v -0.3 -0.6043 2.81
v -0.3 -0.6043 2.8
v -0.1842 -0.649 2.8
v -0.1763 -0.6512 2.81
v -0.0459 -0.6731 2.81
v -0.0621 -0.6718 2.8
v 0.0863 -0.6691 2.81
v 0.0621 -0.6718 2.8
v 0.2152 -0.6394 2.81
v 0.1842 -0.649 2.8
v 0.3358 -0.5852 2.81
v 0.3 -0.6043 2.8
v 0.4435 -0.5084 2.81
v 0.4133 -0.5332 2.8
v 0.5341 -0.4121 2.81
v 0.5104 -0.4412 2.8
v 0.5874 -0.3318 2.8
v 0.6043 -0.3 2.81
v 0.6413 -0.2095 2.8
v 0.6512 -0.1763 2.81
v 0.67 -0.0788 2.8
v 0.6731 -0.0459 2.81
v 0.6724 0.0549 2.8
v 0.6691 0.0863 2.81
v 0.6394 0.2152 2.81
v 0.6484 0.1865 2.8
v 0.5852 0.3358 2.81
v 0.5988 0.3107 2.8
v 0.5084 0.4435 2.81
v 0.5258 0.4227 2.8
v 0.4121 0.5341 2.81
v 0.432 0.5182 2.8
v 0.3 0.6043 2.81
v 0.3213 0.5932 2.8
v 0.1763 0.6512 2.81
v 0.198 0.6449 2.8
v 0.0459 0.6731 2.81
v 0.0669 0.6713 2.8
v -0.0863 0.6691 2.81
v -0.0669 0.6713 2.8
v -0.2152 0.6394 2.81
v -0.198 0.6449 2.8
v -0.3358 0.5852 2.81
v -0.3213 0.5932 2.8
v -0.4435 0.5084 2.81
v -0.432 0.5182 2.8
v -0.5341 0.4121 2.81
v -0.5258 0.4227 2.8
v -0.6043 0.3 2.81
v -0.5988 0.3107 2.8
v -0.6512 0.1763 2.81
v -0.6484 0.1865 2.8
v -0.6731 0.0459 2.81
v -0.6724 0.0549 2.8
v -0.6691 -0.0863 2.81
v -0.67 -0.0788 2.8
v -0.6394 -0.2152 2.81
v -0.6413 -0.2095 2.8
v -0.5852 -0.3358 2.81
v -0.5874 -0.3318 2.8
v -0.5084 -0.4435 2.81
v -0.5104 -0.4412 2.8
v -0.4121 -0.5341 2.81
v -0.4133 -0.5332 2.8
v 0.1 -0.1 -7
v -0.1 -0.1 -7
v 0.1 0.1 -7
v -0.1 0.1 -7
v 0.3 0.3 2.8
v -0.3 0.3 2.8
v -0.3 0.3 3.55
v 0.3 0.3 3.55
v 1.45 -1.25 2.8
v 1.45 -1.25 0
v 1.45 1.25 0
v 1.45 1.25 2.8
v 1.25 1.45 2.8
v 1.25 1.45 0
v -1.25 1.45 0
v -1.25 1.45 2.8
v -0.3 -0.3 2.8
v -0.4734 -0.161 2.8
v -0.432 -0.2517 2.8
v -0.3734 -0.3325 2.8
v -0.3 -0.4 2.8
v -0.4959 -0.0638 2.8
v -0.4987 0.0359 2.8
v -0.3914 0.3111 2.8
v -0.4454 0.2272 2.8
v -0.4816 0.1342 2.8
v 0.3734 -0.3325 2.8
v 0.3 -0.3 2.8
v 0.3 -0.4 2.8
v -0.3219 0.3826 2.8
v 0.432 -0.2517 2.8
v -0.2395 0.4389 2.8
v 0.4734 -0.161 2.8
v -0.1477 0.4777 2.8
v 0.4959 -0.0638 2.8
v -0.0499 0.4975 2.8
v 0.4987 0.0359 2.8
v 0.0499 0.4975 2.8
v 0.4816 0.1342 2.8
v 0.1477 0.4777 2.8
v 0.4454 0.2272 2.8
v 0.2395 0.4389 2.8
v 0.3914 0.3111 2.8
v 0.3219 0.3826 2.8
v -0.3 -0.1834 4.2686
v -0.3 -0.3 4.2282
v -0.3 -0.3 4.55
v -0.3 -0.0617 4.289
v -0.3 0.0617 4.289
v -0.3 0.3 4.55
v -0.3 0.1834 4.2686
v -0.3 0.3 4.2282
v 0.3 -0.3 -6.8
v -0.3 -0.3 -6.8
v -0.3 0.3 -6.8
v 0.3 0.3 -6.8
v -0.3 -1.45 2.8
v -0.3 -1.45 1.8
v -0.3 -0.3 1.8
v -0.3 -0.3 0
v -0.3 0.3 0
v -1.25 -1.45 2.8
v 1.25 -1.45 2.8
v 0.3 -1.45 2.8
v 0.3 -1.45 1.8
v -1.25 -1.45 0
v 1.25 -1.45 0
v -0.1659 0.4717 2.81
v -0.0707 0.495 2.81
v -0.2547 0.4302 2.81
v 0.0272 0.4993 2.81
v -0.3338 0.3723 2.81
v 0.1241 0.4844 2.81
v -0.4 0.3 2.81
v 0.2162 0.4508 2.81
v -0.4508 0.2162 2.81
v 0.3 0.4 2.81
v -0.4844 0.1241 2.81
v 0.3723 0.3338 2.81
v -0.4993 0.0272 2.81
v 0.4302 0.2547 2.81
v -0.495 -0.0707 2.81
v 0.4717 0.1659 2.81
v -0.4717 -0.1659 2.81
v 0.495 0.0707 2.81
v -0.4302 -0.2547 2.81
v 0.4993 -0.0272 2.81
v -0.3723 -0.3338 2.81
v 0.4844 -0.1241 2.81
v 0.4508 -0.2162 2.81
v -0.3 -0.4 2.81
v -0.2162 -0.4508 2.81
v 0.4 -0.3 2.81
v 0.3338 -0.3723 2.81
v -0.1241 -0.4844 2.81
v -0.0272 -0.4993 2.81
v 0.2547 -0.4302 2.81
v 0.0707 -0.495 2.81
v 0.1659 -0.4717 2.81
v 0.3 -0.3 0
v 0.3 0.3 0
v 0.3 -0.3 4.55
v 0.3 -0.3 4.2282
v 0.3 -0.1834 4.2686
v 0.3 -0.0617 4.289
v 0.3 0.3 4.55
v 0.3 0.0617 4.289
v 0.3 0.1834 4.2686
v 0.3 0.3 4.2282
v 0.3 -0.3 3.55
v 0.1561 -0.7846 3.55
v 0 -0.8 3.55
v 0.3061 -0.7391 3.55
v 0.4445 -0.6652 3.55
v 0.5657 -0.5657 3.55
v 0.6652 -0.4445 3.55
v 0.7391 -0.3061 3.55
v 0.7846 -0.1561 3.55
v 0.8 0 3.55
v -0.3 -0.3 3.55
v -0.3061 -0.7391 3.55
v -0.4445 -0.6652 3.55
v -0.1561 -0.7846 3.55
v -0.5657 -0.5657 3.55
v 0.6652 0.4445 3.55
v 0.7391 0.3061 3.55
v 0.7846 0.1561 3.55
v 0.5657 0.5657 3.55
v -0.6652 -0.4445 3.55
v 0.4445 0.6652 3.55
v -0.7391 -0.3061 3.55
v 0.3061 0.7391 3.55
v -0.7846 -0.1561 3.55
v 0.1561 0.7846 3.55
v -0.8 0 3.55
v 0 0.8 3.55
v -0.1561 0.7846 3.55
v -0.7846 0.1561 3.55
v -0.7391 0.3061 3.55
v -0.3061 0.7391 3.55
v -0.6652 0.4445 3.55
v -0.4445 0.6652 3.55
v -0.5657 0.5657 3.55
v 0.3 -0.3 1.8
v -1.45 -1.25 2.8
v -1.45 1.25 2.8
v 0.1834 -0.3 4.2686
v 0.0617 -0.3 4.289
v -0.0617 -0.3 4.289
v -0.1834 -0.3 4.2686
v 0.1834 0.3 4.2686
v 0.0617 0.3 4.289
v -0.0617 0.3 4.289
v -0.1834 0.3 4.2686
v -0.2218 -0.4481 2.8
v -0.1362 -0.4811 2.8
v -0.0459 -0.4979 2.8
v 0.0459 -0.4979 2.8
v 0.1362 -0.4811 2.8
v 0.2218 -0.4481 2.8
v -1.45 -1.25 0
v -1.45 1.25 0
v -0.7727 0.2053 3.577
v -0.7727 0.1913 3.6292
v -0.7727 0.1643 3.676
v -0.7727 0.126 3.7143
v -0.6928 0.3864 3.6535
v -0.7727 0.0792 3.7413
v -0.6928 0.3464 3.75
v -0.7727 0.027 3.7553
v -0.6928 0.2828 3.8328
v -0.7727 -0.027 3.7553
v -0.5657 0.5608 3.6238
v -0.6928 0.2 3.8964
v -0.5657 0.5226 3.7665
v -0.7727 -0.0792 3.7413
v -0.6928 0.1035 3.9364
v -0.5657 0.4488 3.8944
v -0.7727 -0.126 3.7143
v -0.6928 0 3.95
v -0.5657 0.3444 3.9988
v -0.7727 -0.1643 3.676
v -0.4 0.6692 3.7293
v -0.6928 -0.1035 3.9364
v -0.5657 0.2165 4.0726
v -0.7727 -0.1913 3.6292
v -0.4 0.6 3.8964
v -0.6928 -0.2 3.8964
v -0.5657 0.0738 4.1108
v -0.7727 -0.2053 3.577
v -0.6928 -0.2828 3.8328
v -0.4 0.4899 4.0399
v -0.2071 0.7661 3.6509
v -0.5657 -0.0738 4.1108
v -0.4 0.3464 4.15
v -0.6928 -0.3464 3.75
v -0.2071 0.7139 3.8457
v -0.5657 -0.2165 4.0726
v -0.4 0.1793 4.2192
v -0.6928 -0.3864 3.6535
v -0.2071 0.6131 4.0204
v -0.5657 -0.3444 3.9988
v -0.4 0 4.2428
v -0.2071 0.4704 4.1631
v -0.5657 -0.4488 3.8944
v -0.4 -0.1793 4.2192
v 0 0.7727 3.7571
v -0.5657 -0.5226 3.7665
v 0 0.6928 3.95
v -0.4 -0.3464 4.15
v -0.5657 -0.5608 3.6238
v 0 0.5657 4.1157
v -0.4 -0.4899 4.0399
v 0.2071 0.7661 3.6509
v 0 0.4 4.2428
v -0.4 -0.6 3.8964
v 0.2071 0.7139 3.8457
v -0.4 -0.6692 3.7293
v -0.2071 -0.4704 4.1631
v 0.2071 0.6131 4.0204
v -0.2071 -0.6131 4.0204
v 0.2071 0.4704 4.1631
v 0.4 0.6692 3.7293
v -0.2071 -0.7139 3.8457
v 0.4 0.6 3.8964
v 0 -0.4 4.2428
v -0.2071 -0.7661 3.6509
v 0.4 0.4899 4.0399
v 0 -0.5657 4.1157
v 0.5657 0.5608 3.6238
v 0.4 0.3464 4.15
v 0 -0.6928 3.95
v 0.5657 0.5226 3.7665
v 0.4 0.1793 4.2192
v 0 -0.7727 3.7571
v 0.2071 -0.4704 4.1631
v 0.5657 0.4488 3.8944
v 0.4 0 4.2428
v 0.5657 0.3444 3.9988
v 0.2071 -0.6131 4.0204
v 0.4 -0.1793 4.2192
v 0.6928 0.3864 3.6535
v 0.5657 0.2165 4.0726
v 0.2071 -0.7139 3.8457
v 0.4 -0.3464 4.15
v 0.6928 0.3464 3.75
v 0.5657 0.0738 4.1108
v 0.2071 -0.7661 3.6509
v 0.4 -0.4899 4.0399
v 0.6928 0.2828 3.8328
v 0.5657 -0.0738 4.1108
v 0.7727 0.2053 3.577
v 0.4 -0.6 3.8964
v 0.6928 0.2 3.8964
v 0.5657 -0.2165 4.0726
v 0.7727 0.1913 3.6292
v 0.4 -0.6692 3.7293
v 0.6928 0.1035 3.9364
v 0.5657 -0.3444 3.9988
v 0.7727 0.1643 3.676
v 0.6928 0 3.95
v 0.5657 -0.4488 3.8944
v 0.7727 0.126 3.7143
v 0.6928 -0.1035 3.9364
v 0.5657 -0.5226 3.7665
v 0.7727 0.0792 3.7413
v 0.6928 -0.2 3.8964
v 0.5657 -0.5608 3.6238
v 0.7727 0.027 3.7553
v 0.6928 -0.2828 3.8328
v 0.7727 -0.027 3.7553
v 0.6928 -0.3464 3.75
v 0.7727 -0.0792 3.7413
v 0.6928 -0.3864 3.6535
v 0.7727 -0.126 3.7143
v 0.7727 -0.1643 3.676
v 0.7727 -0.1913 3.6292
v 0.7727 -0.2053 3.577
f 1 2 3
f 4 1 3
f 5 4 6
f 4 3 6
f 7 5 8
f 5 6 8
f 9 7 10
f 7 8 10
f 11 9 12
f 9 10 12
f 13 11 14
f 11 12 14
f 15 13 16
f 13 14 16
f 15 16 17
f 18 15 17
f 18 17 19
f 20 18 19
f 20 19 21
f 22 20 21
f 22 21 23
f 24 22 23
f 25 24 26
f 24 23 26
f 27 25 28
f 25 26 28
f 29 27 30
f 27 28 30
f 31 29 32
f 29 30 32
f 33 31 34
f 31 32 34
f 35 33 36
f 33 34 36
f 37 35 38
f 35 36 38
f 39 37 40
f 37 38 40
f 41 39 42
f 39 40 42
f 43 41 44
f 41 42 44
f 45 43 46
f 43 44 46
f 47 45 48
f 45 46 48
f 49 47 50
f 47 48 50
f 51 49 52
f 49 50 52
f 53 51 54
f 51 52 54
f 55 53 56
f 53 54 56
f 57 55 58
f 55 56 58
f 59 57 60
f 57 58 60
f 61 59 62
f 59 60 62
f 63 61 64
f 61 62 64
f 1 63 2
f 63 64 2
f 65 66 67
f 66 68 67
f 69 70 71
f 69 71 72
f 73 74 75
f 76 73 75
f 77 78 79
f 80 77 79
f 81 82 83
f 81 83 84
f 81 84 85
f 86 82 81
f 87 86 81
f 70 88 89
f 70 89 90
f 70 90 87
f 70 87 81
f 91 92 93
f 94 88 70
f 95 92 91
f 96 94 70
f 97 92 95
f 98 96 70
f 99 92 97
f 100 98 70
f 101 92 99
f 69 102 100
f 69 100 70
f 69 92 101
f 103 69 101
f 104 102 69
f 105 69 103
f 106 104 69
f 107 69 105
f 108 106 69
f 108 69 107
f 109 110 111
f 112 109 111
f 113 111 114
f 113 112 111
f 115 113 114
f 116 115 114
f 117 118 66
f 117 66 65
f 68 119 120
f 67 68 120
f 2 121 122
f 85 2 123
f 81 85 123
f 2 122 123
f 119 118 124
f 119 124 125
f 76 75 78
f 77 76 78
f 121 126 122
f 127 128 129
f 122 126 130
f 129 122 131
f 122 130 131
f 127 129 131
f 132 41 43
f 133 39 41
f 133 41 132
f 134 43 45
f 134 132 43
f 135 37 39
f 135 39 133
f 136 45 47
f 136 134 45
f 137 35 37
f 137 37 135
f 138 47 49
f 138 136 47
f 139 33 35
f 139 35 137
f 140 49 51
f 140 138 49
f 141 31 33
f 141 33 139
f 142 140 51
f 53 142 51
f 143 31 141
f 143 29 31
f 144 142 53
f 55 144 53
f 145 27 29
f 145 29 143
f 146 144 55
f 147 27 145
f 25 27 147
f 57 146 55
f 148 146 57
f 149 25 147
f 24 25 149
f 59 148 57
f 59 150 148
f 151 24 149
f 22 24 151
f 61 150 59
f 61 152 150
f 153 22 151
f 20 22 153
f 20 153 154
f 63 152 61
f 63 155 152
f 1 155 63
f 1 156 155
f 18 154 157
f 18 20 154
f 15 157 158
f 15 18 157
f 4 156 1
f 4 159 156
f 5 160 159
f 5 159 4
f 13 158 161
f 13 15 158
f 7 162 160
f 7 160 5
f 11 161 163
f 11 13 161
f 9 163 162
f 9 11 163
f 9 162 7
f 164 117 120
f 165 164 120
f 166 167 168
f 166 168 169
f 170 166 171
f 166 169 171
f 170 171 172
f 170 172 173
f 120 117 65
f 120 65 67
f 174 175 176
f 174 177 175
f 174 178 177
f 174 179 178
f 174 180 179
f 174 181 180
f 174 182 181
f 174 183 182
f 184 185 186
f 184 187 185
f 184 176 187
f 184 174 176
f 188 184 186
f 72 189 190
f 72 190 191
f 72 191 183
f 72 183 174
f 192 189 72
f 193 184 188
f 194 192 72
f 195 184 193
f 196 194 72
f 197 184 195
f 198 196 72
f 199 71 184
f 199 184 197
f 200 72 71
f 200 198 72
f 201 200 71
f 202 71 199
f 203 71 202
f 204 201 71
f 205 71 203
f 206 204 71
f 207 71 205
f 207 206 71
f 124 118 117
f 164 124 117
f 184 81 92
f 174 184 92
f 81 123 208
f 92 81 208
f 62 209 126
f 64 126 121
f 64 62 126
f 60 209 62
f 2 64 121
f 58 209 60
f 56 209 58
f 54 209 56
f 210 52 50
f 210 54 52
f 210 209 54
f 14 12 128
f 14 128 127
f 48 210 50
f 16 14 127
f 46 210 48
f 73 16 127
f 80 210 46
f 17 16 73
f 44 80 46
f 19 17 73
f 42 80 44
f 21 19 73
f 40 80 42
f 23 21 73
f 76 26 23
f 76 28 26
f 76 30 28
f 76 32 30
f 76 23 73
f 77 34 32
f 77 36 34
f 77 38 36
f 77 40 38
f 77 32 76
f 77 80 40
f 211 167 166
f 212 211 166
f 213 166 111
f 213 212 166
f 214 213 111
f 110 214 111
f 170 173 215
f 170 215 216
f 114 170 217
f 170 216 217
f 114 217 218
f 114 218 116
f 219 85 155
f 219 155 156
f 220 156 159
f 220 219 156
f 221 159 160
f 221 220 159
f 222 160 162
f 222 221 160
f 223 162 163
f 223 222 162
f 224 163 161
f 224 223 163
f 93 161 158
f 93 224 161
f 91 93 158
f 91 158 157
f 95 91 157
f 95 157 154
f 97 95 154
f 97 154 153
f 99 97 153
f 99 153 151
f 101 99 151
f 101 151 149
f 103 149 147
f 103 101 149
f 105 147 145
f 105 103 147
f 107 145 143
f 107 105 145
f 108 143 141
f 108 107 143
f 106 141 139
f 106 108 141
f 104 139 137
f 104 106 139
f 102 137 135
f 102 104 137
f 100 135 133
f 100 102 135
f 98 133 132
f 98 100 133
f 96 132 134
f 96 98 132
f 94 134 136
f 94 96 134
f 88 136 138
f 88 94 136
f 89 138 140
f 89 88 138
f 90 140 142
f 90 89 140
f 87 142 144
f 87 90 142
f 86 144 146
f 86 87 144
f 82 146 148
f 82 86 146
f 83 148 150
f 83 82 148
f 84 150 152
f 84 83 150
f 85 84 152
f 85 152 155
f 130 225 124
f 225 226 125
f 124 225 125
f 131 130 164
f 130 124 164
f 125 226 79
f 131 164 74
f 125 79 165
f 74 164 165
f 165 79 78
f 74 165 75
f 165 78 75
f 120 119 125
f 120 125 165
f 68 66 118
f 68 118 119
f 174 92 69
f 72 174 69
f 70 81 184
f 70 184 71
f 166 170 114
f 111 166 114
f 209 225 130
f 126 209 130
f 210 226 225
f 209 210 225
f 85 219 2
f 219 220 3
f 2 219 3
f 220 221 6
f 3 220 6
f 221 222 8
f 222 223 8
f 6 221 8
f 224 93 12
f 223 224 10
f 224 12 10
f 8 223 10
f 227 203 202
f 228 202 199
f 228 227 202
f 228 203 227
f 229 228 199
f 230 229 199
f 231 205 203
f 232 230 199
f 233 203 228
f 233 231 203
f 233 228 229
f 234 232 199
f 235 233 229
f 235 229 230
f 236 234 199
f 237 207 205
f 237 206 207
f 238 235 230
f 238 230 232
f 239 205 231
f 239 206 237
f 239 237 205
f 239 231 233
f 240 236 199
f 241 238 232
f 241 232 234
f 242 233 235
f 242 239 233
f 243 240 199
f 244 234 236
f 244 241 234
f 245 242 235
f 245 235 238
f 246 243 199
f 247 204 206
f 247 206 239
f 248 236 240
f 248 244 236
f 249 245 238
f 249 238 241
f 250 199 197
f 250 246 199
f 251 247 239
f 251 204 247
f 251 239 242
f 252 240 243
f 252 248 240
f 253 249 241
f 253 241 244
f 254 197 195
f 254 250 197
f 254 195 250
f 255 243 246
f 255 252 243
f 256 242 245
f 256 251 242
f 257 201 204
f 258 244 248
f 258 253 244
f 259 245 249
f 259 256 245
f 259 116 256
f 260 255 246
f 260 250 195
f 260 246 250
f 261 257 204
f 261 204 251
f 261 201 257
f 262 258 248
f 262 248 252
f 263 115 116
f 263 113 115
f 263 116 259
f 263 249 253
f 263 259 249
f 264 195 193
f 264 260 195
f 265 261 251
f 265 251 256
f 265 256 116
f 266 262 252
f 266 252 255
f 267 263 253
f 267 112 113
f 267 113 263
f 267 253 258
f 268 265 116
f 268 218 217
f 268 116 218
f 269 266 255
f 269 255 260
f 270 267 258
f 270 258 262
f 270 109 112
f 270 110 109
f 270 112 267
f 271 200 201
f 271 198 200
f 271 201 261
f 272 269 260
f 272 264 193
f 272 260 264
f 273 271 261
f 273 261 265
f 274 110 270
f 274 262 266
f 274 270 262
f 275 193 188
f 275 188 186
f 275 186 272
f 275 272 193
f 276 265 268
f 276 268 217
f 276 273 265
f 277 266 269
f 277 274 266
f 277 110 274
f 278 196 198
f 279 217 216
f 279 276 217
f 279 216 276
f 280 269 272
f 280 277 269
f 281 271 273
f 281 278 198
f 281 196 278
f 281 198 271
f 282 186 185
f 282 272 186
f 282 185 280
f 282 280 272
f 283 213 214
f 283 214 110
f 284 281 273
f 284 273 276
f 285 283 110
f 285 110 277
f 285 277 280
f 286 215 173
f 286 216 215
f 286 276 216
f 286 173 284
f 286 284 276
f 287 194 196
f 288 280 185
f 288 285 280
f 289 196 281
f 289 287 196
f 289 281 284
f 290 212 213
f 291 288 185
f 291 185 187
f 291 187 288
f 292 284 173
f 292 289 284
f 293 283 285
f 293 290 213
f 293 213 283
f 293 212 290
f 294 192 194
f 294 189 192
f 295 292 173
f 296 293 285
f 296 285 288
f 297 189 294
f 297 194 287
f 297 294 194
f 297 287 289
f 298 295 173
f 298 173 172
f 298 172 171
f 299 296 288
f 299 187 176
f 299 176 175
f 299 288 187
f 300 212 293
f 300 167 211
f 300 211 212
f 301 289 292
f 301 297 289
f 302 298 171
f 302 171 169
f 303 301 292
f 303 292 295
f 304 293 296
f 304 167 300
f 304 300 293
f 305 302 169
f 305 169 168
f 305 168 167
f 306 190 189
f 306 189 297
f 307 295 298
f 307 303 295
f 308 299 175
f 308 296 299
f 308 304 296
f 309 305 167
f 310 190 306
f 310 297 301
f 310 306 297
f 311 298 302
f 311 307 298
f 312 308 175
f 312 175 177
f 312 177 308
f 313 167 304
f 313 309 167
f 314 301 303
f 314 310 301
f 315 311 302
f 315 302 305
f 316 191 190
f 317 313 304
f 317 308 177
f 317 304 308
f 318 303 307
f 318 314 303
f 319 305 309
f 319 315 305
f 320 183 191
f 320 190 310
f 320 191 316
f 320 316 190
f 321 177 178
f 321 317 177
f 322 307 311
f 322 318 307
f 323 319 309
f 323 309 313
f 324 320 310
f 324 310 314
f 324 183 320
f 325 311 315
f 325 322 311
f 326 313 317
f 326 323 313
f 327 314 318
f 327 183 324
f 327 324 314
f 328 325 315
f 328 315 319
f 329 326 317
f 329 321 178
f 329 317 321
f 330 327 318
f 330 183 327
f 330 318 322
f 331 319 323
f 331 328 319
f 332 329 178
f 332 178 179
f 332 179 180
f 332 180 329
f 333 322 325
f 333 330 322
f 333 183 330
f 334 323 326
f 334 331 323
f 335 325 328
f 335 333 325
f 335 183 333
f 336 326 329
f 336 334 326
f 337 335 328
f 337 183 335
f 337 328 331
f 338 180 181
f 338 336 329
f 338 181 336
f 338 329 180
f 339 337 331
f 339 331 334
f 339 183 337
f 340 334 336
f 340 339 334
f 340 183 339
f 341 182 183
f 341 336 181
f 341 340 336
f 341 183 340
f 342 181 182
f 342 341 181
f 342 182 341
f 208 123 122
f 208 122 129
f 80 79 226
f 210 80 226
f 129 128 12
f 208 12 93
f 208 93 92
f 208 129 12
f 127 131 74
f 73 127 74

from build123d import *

# Parameters (mm, degrees)
ESQUISSE1_W             = 0.6
ESQUISSE1_H             = 0.6
BOSS_EXTRU_1_DEPTH      = 2.8
ESQUISSE2_W             = 0.6
ESQUISSE2_H             = 1.15
ENL_V_MAT_EXTRU_1_DEPTH = 1
BOSS_EXTRU_2_DEPTH      = 0.75
BOSS_EXTRU_2_DEPTH_BACK = 9.8
ESQUISSE3_W             = 0.6
ESQUISSE3_H             = 0.6
CHANFREIN1_SIZE         = 0.2
ESQUISSE4_R             = 0.674645205
ESQUISSE4_R_2           = 0.5
BOSS_EXTRU_3_DEPTH      = 0.01
R_VOLUTION1_ANGLE       = 180
ESQUISSE6_W             = 0.6
ESQUISSE6_H             = 0.6
BOSS_EXTRU_4_DEPTH      = 1


with BuildPart() as part:
    # Esquisse1 → Boss.-Extru.1 (new body)
    with BuildSketch(Plane.XY):
        Polygon((-1.25, 1.45), (-1.45, 1.25), (-1.45, -1.25), (-1.25, -1.45), (1.25, -1.45), (1.45, -1.25), (1.45, 1.25), (1.25, 1.45), align=None)
        Rectangle(ESQUISSE1_W, ESQUISSE1_H, mode=Mode.SUBTRACT)
    extrude(amount=BOSS_EXTRU_1_DEPTH)

    # Esquisse2 → Enlèv. mat.-Extru.1 (cut)
    with BuildSketch(Plane.XY.offset(2.8)):
        with Locations((0, -0.875)):
            Rectangle(ESQUISSE2_W, ESQUISSE2_H)
    extrude(amount=-ENL_V_MAT_EXTRU_1_DEPTH, mode=Mode.SUBTRACT)

    # Esquisse3 → Boss.-Extru.2 (add, two sides: drawn at the far end of the back side and taken through both)
    with BuildSketch(Plane.XY.offset(2.8).offset(-BOSS_EXTRU_2_DEPTH_BACK)):
        Rectangle(ESQUISSE3_W, ESQUISSE3_H)
    extrude(amount=BOSS_EXTRU_2_DEPTH + BOSS_EXTRU_2_DEPTH_BACK)

    # Chanfrein1
    chanfrein1_edges = [part.edges().sort_by_distance(p)[0] for p in [
        (0, -0.3, -7),
        (0.3, 0, -7),
        (-0.3, 0, -7),
        (0, 0.3, -7),
    ]]
    chamfer(chanfrein1_edges, length=CHANFREIN1_SIZE)

    # Esquisse4 → Boss.-Extru.3 (add)
    with BuildSketch(Plane.XY.offset(2.8)):
        with Locations(Location((0, 0, 0), (0, 0, 243.597249523))):
            Circle(ESQUISSE4_R)
        with Locations(Location((0, 0, 0), (0, 0, 233.130102354))):
            Circle(ESQUISSE4_R_2, mode=Mode.SUBTRACT)
    extrude(amount=BOSS_EXTRU_3_DEPTH)

    # Esquisse5 → Révolution1 (revolve)
    with BuildSketch(Plane.XY.offset(3.55)):
        with BuildLine():
            Line((0.8, 0), (-0.8, 0))
            ThreePointArc((-0.8, 0), (0, 0.8), (0.8, 0))
        make_face()
    revolve(axis=Axis((0.8, 0, 3.55), (1, 0, 0)), revolution_arc=R_VOLUTION1_ANGLE)

    # Esquisse6 → Boss.-Extru.4 (add)
    with BuildSketch(Plane(origin=(0, 0, 3.55), x_dir=(-1, 0, 0), z_dir=(0, 0, -1))):
        Rectangle(ESQUISSE6_W, ESQUISSE6_H)
    extrude(amount=-BOSS_EXTRU_4_DEPTH)


solid = part.part
